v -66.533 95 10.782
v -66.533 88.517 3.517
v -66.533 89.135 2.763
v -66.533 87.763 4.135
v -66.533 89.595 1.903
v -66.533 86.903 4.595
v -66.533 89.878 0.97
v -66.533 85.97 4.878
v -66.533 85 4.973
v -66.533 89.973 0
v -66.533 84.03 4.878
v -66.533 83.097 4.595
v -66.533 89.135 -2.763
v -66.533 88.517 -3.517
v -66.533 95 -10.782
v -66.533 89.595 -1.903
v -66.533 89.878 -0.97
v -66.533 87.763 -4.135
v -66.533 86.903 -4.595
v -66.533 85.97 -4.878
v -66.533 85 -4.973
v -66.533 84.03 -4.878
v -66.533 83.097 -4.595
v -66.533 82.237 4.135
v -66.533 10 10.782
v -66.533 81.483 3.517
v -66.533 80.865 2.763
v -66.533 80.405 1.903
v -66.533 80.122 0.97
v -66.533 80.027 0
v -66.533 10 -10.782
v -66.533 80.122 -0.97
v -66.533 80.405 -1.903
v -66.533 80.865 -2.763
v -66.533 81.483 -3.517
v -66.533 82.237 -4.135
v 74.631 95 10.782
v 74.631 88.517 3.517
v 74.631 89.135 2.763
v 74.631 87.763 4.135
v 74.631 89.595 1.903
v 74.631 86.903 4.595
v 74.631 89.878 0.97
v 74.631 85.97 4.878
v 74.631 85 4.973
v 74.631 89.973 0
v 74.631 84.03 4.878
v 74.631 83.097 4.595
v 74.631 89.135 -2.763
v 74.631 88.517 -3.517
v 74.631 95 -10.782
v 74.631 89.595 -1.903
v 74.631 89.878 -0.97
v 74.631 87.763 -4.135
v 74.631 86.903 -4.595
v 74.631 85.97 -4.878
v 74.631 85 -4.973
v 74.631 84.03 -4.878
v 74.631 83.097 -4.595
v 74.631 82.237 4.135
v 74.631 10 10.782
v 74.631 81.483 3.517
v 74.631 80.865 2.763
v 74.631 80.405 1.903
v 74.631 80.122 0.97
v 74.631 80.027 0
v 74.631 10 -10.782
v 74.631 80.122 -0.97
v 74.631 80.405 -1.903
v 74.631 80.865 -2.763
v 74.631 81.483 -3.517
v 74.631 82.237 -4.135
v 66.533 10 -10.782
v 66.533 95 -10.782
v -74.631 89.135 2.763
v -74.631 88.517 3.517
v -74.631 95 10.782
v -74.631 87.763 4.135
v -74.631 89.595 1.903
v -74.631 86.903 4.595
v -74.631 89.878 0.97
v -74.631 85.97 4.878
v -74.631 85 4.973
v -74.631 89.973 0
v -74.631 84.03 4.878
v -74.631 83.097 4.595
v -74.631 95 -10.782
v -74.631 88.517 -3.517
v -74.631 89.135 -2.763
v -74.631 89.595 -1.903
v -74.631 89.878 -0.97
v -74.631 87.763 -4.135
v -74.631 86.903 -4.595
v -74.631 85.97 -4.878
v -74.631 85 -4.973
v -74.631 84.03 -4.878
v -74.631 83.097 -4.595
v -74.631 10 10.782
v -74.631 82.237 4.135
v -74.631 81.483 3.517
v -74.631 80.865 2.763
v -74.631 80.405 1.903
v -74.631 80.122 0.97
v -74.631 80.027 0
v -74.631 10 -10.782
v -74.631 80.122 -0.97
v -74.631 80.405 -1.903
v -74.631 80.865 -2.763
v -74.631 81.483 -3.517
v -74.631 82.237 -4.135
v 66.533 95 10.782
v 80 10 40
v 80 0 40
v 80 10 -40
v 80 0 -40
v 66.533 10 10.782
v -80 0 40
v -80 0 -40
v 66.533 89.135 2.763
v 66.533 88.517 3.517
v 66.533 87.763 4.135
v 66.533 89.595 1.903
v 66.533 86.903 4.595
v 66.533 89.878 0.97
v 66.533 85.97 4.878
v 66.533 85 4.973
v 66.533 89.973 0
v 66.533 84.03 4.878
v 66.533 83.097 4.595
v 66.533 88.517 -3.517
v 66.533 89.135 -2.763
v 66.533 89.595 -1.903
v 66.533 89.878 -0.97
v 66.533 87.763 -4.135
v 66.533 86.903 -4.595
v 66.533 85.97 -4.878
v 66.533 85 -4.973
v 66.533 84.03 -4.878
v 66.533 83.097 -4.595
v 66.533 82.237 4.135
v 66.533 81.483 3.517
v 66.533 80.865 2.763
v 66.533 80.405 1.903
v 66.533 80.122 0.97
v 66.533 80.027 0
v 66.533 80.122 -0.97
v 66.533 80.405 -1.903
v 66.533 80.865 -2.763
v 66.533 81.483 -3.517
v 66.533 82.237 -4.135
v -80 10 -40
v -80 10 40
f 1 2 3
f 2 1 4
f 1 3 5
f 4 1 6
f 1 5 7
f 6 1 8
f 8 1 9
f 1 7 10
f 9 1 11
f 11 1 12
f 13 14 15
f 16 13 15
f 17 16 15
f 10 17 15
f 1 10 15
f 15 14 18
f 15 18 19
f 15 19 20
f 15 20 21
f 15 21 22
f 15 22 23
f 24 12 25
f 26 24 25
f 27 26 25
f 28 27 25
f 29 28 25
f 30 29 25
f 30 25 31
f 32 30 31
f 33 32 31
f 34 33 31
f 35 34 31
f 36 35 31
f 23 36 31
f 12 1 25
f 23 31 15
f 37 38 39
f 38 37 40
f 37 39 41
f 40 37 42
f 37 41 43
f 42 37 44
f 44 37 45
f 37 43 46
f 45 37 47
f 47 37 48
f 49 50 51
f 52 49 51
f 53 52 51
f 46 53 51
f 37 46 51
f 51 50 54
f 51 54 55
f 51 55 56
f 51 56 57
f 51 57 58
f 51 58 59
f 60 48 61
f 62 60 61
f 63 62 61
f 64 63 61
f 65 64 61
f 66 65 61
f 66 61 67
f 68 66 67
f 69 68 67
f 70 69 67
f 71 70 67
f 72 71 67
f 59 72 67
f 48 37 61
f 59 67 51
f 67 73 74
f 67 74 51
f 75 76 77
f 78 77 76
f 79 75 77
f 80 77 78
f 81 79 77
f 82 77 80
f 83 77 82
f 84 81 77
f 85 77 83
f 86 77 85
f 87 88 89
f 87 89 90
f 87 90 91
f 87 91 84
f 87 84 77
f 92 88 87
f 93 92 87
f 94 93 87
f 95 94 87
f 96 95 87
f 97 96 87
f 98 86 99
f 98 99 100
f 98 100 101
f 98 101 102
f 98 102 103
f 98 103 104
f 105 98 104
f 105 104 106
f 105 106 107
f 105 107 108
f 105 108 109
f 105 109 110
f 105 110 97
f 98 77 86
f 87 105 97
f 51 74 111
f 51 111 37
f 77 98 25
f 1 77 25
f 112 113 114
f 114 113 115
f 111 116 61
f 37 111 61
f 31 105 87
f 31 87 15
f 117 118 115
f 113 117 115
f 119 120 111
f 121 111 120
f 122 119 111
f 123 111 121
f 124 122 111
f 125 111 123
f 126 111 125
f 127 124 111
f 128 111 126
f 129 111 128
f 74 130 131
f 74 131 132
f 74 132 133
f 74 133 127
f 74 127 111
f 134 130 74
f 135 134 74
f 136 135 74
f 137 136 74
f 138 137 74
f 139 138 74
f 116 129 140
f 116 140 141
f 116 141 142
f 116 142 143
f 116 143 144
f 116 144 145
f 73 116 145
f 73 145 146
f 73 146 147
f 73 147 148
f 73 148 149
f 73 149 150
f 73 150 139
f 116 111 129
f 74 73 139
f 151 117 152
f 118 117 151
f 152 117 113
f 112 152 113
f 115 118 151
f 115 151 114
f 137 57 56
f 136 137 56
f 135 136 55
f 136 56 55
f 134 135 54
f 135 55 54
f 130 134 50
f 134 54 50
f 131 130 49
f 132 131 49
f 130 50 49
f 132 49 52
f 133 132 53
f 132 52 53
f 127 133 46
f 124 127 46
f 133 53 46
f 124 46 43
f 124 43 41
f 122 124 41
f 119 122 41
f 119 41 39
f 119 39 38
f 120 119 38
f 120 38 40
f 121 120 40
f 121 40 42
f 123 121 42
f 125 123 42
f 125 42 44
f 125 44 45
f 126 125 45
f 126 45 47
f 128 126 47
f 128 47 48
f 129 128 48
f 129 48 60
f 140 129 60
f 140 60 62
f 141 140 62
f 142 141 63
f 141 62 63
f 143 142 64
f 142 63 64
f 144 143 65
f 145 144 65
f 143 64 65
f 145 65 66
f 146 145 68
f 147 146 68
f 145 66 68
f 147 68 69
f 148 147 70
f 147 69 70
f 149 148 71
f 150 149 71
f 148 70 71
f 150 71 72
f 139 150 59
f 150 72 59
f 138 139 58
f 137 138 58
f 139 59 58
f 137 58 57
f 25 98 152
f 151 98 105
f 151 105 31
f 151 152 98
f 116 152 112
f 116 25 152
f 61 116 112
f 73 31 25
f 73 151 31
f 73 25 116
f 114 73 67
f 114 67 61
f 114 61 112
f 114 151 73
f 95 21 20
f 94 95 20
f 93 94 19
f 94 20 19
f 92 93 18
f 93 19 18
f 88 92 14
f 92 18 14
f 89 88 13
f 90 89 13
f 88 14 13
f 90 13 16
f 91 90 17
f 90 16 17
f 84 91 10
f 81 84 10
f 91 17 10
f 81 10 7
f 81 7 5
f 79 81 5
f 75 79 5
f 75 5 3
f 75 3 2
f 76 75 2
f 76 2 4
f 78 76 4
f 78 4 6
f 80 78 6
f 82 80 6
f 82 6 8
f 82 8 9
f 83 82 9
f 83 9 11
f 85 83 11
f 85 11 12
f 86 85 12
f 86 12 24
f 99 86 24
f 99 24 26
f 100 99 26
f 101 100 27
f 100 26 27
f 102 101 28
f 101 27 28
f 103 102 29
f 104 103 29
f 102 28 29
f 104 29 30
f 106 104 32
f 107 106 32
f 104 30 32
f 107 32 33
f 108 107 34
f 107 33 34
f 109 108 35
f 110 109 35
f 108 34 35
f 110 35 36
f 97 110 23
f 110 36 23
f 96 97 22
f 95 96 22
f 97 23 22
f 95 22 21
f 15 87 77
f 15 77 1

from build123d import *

# Parameters (mm, degrees)
SKETCH1_W             = 8.098713366
SKETCH1_H             = 21.564091284
BOSS_EXTRUDE2_DEPTH   = 95
BOSS_EXTRUDE2_2_DEPTH = 95
SKETCH1_5_W           = 160
SKETCH1_5_H           = 80
SKETCH1_5_W_2         = 8.098713366
SKETCH1_5_H_2         = 21.564091284
BOSS_EXTRUDE3_DEPTH   = 10
SKETCH3_R             = 4.973174901
CUT_EXTRUDE1_DEPTH    = 155.631415981


with BuildPart() as part:
    # Sketch1 → Boss-Extrude2 (new body)
    with BuildSketch(Plane(origin=(0, 0, 0), x_dir=(1, 0, 0), z_dir=(0, 1, 0))):
        with Locations((-70.582059298, 0)):
            Rectangle(SKETCH1_W, SKETCH1_H)
    extrude(amount=BOSS_EXTRUDE2_DEPTH)



with BuildPart() as body_2:
    # Sketch1 → Boss-Extrude2 2 (new body)
    with BuildSketch(Plane(origin=(0, 0, 0), x_dir=(1, 0, 0), z_dir=(0, 1, 0))):
        with Locations((70.582059298, 0)):
            Rectangle(SKETCH1_W, SKETCH1_H)
    extrude(amount=BOSS_EXTRUDE2_2_DEPTH)


with BuildPart() as part_1:
    add(part.part)

    add(body_2.part)  # Boss-Extrude3 merges body 2
    # Sketch1<5> → Boss-Extrude3 (add)
    with BuildSketch(Plane(origin=(0, 0, 0), x_dir=(1, 0, 0), z_dir=(0, 1, 0))):
        Rectangle(SKETCH1_5_W, SKETCH1_5_H)
        with Locations((-70.582059298, 0)):
            Rectangle(SKETCH1_5_W_2, SKETCH1_5_H_2, mode=Mode.SUBTRACT)
        with Locations((70.582059298, 0)):
            Rectangle(SKETCH1_5_W_2, SKETCH1_5_H_2, mode=Mode.SUBTRACT)
    extrude(amount=BOSS_EXTRUDE3_DEPTH)

    # Sketch3 → Cut-Extrude1 (cut, through all)
    with BuildSketch(Plane(origin=(74.631415981, 0, 0), x_dir=(0, 0, -1), z_dir=(1, 0, 0))):
        with Locations((0, 85)):
            Circle(SKETCH3_R)
    extrude(amount=-CUT_EXTRUDE1_DEPTH, mode=Mode.SUBTRACT)


solid = part_1.part
